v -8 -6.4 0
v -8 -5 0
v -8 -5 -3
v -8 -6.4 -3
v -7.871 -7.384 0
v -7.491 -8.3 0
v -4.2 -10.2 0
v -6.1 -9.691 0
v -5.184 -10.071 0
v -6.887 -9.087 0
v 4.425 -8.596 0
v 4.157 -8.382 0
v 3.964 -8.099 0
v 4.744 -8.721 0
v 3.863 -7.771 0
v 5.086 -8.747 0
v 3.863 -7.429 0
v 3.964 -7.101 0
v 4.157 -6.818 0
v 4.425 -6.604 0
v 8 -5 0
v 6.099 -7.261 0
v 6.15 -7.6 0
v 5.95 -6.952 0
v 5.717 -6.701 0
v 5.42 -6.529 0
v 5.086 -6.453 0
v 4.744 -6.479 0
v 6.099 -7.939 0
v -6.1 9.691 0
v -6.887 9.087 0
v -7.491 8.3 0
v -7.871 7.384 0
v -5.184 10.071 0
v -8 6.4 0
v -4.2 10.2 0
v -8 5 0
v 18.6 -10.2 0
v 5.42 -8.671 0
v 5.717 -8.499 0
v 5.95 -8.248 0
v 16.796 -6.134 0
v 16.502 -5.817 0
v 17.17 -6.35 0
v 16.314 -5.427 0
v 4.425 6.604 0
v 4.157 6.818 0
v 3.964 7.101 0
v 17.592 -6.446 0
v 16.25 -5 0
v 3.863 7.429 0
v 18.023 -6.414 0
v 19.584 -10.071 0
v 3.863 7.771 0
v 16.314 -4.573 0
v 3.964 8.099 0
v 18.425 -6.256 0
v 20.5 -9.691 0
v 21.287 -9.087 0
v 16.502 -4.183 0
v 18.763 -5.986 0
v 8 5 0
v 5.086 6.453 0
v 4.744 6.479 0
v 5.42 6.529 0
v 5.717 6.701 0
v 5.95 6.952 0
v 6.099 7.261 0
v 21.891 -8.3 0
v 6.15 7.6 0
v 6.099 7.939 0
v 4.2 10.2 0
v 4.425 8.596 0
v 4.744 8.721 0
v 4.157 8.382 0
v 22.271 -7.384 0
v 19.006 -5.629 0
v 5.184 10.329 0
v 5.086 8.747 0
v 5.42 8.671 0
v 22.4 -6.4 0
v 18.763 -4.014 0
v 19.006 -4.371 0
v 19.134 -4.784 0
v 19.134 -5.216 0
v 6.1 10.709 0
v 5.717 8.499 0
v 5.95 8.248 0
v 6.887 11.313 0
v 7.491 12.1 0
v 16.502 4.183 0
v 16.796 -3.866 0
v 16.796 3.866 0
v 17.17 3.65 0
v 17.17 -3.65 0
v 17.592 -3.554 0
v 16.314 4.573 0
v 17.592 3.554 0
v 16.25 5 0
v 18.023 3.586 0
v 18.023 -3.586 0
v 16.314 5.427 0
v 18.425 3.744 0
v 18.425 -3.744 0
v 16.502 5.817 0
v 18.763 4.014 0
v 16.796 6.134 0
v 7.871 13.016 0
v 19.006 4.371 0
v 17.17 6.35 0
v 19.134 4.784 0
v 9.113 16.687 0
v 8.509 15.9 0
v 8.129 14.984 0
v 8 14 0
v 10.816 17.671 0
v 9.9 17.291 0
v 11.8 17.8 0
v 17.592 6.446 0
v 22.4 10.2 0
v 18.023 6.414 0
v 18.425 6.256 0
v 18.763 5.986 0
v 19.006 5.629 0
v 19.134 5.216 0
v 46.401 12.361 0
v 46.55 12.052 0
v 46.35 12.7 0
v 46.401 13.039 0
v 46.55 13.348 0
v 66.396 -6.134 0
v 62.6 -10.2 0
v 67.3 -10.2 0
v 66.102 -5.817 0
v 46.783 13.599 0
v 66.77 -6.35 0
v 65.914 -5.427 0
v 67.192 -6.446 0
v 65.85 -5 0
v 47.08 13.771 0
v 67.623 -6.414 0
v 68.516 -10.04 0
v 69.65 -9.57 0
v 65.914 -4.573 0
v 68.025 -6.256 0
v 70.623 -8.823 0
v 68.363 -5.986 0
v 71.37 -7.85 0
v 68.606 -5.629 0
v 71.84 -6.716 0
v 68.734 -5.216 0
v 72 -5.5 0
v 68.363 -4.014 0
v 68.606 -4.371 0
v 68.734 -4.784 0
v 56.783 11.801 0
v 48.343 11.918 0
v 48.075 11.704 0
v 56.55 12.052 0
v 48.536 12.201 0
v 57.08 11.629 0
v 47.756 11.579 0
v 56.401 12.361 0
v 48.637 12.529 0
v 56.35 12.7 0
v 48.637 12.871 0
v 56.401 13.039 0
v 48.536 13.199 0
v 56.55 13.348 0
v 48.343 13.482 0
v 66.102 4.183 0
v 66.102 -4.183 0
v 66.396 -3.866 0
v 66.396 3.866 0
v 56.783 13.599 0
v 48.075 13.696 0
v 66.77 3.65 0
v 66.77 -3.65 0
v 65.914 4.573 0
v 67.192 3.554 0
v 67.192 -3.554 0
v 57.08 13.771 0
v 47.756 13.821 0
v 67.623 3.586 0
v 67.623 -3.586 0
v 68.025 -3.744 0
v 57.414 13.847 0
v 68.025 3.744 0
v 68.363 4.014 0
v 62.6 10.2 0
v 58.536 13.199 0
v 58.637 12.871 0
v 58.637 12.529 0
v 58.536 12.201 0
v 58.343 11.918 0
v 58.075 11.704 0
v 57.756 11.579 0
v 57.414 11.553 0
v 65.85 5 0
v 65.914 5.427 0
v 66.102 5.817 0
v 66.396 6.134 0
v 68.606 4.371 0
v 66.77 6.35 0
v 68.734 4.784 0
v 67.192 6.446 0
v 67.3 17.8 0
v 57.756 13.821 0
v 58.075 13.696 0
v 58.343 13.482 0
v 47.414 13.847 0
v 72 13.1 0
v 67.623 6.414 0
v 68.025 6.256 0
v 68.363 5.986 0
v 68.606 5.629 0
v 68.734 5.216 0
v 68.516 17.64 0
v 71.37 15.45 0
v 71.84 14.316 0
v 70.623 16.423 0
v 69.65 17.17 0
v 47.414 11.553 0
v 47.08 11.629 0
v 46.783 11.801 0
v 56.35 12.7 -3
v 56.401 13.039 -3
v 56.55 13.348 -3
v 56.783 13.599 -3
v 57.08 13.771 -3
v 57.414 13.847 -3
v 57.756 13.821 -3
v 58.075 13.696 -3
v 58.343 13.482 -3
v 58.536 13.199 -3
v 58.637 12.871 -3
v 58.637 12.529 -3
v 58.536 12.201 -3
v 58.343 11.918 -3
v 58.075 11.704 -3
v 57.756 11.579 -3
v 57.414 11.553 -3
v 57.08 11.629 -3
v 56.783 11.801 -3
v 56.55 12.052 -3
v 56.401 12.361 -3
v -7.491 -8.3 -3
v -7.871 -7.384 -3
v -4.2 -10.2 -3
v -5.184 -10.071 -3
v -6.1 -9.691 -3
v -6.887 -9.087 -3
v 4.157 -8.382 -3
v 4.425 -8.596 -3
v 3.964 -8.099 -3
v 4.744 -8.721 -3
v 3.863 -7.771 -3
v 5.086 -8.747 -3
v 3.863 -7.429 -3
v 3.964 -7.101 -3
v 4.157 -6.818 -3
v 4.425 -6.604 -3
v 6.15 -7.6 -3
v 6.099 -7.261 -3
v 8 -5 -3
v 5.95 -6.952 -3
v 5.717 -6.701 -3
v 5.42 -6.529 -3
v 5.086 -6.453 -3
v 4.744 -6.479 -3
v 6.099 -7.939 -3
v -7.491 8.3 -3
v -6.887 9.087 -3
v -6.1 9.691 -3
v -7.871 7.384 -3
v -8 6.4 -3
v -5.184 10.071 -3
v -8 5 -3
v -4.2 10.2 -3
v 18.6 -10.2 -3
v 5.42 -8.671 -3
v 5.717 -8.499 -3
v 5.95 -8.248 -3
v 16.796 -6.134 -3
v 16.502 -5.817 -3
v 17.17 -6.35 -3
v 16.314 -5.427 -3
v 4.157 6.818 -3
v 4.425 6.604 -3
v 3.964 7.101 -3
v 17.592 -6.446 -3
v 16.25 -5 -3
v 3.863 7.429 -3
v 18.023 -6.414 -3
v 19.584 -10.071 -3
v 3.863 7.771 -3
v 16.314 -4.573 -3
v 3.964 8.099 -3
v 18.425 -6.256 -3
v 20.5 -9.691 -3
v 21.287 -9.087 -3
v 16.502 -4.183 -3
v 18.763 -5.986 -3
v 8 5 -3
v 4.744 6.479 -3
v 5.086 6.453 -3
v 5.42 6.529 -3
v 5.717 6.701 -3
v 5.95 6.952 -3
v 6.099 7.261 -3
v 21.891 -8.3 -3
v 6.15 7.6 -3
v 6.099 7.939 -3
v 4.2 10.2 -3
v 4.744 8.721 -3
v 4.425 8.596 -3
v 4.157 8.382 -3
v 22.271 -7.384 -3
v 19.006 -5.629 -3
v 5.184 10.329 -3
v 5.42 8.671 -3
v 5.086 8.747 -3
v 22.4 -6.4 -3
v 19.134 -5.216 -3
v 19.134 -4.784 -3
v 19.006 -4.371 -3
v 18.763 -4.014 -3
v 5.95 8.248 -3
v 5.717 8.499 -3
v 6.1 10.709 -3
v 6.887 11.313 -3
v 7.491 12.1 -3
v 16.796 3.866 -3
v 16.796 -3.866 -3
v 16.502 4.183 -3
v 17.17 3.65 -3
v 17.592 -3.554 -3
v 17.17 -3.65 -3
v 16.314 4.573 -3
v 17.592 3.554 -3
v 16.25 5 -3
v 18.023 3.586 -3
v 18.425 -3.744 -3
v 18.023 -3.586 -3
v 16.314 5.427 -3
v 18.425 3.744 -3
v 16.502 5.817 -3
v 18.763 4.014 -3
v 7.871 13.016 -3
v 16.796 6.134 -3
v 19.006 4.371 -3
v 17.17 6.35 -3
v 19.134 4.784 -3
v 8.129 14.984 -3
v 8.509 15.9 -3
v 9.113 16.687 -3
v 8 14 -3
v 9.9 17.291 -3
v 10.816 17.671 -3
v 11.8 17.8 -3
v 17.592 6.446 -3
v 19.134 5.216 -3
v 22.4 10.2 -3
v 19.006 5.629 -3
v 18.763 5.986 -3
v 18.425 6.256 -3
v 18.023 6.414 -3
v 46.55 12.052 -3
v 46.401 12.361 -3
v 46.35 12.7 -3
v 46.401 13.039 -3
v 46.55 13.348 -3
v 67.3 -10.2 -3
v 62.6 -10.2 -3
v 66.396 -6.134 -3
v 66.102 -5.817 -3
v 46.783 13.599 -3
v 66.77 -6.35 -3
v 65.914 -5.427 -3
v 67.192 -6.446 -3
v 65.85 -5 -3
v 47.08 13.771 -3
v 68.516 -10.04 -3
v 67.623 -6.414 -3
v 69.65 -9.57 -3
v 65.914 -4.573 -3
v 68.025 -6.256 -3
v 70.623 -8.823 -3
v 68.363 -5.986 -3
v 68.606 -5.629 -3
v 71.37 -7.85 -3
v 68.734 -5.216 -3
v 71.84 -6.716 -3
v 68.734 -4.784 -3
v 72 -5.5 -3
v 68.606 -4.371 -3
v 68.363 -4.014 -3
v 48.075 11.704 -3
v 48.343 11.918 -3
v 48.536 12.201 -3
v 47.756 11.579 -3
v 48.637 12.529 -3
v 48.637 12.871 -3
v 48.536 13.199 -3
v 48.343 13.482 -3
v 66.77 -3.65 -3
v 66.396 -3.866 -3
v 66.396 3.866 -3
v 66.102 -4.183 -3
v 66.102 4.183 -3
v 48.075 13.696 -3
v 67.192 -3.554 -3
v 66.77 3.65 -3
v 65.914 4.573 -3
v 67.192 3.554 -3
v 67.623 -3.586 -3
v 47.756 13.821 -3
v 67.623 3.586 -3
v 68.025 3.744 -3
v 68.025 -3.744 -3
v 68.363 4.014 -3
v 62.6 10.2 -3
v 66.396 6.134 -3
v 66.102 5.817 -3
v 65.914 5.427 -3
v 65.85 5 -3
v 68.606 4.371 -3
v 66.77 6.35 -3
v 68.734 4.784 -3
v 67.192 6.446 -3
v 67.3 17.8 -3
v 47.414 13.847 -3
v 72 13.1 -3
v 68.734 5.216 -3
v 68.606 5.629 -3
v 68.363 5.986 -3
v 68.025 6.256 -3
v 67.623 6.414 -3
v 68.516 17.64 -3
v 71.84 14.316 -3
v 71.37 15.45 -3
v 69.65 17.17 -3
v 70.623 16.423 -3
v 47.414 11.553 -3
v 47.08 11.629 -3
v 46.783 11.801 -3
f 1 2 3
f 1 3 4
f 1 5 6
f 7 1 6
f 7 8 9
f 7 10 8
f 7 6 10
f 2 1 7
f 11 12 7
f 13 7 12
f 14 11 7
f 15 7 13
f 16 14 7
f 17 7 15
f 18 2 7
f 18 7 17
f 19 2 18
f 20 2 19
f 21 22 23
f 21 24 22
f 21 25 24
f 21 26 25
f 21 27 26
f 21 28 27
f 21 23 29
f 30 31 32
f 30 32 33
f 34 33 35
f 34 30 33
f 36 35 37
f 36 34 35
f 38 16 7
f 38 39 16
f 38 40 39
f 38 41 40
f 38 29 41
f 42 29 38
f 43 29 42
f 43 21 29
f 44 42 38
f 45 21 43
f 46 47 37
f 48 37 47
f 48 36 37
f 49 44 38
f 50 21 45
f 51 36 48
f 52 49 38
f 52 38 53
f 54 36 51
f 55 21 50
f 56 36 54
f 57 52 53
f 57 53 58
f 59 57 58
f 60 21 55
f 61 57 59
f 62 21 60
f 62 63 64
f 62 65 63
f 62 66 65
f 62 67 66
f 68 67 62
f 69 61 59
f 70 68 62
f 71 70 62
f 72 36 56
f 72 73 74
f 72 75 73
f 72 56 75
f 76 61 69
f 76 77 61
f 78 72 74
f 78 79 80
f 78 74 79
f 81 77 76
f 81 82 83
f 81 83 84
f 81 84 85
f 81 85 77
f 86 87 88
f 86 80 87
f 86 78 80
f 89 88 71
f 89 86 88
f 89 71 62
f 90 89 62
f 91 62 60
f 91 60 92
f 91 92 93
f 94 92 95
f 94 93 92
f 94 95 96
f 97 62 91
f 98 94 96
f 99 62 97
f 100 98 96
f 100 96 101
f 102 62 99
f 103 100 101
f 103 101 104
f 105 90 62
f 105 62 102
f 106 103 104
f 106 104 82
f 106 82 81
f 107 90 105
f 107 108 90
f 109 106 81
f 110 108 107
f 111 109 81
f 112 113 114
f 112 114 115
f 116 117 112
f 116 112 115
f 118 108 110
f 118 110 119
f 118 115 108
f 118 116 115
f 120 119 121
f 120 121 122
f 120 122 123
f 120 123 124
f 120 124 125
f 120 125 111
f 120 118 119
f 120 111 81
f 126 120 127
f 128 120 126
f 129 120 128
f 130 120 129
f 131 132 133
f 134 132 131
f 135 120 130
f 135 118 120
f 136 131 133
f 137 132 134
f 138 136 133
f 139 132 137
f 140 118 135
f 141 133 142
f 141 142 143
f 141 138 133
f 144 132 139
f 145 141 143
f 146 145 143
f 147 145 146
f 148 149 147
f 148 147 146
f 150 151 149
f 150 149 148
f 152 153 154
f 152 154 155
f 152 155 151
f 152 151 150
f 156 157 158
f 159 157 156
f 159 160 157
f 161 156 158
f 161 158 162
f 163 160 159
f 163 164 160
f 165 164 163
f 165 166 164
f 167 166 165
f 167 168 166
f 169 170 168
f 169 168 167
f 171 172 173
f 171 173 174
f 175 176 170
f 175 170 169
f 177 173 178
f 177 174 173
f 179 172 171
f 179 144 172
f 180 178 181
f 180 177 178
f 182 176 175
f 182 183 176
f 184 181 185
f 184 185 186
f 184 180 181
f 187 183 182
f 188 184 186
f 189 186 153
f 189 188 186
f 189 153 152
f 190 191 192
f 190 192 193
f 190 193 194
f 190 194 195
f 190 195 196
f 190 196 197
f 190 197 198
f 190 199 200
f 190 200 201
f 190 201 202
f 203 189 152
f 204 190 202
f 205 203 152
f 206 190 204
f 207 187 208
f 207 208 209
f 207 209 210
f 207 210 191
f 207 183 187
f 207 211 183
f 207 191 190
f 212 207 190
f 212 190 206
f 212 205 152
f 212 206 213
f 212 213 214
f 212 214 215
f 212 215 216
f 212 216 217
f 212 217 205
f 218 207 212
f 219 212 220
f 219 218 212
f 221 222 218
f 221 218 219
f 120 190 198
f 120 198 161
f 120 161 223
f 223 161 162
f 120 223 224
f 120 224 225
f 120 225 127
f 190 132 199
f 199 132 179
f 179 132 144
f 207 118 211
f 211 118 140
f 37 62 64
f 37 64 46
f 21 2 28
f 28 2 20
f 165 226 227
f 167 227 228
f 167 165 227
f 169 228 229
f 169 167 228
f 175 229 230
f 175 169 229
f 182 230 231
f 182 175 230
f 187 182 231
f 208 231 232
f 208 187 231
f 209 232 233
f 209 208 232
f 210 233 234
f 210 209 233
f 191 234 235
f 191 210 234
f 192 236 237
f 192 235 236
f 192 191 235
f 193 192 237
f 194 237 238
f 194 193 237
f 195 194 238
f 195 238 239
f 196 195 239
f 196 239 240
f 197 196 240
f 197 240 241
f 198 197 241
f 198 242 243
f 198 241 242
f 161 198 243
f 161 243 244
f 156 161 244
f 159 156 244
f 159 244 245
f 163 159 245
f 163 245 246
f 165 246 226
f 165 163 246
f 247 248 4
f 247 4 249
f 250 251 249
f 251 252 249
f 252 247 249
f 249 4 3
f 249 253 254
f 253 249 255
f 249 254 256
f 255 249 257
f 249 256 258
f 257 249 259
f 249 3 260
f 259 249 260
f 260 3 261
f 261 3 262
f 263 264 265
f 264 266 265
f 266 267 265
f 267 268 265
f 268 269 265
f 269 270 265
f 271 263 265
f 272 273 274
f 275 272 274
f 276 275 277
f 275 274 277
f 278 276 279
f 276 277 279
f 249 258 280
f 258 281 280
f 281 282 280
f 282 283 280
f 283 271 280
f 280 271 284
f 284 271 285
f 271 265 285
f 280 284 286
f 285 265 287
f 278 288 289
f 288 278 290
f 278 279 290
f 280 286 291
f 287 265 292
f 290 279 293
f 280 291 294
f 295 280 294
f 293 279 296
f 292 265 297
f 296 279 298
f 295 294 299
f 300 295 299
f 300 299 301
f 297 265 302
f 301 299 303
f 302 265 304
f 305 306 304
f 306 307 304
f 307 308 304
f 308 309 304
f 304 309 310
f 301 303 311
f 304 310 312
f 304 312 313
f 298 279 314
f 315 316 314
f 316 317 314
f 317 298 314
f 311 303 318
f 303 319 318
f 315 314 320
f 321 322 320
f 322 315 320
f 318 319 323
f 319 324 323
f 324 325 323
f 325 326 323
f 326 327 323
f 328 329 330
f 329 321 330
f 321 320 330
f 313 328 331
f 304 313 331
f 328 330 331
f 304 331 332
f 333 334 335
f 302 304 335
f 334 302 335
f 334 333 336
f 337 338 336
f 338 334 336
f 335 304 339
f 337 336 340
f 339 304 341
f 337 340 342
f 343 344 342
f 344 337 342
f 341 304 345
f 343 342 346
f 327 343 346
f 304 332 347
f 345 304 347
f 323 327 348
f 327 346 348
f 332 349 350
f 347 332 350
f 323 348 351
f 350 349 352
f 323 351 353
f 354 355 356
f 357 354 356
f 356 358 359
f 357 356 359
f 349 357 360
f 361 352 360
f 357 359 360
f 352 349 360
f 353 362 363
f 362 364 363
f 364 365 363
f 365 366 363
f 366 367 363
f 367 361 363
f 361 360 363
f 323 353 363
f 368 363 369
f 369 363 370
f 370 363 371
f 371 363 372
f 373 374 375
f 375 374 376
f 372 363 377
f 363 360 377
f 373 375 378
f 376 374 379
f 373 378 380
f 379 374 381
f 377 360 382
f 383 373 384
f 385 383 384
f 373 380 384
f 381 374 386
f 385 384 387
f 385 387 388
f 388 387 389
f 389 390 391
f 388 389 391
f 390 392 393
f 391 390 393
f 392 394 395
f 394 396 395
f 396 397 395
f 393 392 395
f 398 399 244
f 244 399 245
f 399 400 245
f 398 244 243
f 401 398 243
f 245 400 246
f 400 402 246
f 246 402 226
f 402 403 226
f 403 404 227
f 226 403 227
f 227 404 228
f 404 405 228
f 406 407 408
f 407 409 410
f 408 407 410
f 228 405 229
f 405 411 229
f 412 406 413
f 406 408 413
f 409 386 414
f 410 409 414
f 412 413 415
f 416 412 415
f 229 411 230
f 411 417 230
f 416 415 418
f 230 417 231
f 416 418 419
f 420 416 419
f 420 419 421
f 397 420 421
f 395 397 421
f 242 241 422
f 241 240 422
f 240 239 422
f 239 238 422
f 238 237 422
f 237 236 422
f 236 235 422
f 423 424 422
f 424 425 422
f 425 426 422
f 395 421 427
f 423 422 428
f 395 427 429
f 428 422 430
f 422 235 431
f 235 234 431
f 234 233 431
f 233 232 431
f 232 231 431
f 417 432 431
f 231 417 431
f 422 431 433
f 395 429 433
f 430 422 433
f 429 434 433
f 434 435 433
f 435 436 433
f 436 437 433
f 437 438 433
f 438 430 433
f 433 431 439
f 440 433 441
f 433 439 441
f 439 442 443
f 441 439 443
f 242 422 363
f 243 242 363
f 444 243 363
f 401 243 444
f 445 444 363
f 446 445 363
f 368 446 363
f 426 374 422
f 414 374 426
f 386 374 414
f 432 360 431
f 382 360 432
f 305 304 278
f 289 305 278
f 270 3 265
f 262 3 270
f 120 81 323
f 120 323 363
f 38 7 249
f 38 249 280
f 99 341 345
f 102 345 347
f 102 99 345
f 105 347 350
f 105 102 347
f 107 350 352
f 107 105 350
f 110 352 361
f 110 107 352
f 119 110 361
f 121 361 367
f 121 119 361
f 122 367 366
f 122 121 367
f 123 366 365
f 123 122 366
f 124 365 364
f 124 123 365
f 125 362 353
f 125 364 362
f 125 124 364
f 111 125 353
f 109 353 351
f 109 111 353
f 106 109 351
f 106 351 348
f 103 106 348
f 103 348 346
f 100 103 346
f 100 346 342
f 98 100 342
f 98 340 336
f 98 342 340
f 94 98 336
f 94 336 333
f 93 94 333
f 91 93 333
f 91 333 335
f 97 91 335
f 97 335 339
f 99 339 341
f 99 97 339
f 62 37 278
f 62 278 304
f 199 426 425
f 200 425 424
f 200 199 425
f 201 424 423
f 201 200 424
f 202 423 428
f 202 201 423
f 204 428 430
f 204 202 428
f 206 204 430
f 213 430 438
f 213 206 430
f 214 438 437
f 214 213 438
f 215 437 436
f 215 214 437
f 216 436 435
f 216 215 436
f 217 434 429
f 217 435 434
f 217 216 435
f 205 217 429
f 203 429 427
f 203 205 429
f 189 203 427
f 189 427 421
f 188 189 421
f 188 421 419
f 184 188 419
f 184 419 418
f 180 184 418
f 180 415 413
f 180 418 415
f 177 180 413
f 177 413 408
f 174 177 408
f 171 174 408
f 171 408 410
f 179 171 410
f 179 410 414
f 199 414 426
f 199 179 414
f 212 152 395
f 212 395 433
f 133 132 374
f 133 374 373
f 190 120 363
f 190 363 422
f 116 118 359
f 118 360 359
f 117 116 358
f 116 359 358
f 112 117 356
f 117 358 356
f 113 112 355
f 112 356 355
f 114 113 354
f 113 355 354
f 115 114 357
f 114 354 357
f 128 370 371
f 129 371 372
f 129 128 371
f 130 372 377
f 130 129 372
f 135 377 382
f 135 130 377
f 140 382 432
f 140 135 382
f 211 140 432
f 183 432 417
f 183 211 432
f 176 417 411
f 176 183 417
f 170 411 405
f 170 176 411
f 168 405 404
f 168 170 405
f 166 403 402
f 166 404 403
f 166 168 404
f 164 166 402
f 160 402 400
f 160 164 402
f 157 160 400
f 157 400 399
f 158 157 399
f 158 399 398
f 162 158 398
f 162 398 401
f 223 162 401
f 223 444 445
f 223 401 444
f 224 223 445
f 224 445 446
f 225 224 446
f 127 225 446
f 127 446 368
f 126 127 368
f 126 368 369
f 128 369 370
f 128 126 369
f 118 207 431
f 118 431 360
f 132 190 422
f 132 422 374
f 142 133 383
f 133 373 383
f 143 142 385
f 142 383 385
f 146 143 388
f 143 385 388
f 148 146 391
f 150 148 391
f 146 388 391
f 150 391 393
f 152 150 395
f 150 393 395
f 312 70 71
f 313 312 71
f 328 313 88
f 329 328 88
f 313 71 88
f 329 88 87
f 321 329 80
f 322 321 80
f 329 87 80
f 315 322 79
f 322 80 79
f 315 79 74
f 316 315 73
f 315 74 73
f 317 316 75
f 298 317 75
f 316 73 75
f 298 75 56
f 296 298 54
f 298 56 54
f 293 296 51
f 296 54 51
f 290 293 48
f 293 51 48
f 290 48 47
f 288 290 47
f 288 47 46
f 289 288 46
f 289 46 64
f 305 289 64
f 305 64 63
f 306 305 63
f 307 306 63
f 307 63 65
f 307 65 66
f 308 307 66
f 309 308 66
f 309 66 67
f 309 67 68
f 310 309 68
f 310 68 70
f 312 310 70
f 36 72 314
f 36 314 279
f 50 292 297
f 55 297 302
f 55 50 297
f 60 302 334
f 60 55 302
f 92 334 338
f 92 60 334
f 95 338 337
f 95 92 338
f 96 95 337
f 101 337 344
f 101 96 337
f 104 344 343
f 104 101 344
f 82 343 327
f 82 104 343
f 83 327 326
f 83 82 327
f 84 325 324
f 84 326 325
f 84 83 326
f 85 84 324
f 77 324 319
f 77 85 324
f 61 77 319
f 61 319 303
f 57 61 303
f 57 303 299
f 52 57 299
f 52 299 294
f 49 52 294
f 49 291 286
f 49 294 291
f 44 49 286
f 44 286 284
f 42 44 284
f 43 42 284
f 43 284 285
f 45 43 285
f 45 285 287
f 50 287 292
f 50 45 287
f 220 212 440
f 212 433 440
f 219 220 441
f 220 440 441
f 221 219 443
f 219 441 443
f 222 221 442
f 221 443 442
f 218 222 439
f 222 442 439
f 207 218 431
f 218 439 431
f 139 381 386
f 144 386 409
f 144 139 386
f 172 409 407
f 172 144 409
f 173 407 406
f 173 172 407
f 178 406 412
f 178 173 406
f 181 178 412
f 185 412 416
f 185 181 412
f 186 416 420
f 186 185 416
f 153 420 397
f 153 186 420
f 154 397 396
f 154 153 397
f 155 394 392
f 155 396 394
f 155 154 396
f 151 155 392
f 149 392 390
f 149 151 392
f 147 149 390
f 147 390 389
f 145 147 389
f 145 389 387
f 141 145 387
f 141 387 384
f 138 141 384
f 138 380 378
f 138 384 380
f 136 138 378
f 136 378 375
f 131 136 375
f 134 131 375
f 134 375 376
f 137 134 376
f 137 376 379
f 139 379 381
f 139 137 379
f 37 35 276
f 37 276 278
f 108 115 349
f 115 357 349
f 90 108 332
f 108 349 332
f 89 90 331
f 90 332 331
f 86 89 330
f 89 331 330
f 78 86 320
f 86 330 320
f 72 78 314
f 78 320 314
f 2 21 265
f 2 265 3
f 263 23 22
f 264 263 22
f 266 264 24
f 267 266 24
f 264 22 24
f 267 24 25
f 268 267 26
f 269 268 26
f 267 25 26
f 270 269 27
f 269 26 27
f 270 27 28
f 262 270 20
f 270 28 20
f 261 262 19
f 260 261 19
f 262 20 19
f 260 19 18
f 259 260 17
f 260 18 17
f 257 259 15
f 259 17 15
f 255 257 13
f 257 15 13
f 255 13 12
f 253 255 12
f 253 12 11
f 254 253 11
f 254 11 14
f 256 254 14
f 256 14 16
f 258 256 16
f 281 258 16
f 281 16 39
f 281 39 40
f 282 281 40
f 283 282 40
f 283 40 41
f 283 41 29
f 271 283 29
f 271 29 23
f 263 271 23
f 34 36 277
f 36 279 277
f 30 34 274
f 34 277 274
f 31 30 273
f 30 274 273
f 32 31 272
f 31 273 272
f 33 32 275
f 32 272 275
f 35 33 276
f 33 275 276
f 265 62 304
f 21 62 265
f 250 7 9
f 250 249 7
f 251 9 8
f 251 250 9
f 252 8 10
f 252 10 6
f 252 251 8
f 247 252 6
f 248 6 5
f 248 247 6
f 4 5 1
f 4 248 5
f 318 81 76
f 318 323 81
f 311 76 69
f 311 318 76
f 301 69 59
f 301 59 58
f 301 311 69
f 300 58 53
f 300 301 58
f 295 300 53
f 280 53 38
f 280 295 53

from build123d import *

# Parameters (mm, degrees)
BOSS_EXTRUDE7_DEPTH = 3
SKETCH12_R          = 1.15
CUT_EXTRUDE3_DEPTH  = 75.228296491
SKETCH11_R          = 1.45
CUT_EXTRUDE4_DEPTH  = 75.228296491
SKETCH13_R          = 1.15
CUT_EXTRUDE5_DEPTH  = 75.228296491
FILLET1_R           = 4.7
FILLET2_R           = 3.8


with BuildPart() as part:
    # Sketch10 → Boss-Extrude7 (new body)
    with BuildSketch(Plane.XY):
        Polygon((22.4, 10.2), (62.6, 10.2), (62.6, -10.2), (72, -10.2), (72, 17.8), (8, 17.8), (8, 10.2), (-8, 10.2), (-8, 5), (8, 5), (8, -5), (-8, -5), (-8, -10.2), (22.4, -10.2), align=None)
    extrude(amount=-BOSS_EXTRUDE7_DEPTH)

    # Sketch12 → Cut-Extrude3 (cut, through all)
    with BuildSketch(Plane(origin=(0, 0, 0), x_dir=(-1, 0, 0), z_dir=(0, 0, -1))):
        with Locations((-57.5, 12.7)):
            Circle(SKETCH12_R)
        with Locations((-47.5, 12.7)):
            Circle(SKETCH12_R)
    extrude(amount=CUT_EXTRUDE3_DEPTH, mode=Mode.SUBTRACT)

    # Sketch11 → Cut-Extrude4 (cut, through all)
    with BuildSketch(Plane(origin=(0, 0, 0), x_dir=(-1, 0, 0), z_dir=(0, 0, -1))):
        with Locations((-67.3, -5)):
            Circle(SKETCH11_R)
        with Locations((-17.7, -5)):
            Circle(SKETCH11_R)
        with Locations((-17.7, 5)):
            Circle(SKETCH11_R)
        with Locations((-67.3, 5)):
            Circle(SKETCH11_R)
    extrude(amount=CUT_EXTRUDE4_DEPTH, mode=Mode.SUBTRACT)

    # Sketch13 → Cut-Extrude5 (cut, through all)
    with BuildSketch(Plane.XY):
        with Locations((5, 7.6)):
            Circle(SKETCH13_R)
        with Locations((5, -7.6)):
            Circle(SKETCH13_R)
    extrude(amount=-CUT_EXTRUDE5_DEPTH, mode=Mode.SUBTRACT)

    # Fillet1
    fillet1_edges = [part.edges().sort_by_distance(p)[0] for p in [
        (72, 17.8, -1.5),
        (72, -10.2, -1.5),
    ]]
    fillet(fillet1_edges, radius=FILLET1_R)

    # Fillet2
    fillet2_edges = [part.edges().sort_by_distance(p)[0] for p in [
        (22.4, -10.2, -1.5),
        (-8, -10.2, -1.5),
        (8, 17.8, -1.5),
        (8, 10.2, -1.5),
        (-8, 10.2, -1.5),
    ]]
    fillet(fillet2_edges, radius=FILLET2_R - 0.0001)  # a hair under: the kernel refuses the full size


solid = part.part
